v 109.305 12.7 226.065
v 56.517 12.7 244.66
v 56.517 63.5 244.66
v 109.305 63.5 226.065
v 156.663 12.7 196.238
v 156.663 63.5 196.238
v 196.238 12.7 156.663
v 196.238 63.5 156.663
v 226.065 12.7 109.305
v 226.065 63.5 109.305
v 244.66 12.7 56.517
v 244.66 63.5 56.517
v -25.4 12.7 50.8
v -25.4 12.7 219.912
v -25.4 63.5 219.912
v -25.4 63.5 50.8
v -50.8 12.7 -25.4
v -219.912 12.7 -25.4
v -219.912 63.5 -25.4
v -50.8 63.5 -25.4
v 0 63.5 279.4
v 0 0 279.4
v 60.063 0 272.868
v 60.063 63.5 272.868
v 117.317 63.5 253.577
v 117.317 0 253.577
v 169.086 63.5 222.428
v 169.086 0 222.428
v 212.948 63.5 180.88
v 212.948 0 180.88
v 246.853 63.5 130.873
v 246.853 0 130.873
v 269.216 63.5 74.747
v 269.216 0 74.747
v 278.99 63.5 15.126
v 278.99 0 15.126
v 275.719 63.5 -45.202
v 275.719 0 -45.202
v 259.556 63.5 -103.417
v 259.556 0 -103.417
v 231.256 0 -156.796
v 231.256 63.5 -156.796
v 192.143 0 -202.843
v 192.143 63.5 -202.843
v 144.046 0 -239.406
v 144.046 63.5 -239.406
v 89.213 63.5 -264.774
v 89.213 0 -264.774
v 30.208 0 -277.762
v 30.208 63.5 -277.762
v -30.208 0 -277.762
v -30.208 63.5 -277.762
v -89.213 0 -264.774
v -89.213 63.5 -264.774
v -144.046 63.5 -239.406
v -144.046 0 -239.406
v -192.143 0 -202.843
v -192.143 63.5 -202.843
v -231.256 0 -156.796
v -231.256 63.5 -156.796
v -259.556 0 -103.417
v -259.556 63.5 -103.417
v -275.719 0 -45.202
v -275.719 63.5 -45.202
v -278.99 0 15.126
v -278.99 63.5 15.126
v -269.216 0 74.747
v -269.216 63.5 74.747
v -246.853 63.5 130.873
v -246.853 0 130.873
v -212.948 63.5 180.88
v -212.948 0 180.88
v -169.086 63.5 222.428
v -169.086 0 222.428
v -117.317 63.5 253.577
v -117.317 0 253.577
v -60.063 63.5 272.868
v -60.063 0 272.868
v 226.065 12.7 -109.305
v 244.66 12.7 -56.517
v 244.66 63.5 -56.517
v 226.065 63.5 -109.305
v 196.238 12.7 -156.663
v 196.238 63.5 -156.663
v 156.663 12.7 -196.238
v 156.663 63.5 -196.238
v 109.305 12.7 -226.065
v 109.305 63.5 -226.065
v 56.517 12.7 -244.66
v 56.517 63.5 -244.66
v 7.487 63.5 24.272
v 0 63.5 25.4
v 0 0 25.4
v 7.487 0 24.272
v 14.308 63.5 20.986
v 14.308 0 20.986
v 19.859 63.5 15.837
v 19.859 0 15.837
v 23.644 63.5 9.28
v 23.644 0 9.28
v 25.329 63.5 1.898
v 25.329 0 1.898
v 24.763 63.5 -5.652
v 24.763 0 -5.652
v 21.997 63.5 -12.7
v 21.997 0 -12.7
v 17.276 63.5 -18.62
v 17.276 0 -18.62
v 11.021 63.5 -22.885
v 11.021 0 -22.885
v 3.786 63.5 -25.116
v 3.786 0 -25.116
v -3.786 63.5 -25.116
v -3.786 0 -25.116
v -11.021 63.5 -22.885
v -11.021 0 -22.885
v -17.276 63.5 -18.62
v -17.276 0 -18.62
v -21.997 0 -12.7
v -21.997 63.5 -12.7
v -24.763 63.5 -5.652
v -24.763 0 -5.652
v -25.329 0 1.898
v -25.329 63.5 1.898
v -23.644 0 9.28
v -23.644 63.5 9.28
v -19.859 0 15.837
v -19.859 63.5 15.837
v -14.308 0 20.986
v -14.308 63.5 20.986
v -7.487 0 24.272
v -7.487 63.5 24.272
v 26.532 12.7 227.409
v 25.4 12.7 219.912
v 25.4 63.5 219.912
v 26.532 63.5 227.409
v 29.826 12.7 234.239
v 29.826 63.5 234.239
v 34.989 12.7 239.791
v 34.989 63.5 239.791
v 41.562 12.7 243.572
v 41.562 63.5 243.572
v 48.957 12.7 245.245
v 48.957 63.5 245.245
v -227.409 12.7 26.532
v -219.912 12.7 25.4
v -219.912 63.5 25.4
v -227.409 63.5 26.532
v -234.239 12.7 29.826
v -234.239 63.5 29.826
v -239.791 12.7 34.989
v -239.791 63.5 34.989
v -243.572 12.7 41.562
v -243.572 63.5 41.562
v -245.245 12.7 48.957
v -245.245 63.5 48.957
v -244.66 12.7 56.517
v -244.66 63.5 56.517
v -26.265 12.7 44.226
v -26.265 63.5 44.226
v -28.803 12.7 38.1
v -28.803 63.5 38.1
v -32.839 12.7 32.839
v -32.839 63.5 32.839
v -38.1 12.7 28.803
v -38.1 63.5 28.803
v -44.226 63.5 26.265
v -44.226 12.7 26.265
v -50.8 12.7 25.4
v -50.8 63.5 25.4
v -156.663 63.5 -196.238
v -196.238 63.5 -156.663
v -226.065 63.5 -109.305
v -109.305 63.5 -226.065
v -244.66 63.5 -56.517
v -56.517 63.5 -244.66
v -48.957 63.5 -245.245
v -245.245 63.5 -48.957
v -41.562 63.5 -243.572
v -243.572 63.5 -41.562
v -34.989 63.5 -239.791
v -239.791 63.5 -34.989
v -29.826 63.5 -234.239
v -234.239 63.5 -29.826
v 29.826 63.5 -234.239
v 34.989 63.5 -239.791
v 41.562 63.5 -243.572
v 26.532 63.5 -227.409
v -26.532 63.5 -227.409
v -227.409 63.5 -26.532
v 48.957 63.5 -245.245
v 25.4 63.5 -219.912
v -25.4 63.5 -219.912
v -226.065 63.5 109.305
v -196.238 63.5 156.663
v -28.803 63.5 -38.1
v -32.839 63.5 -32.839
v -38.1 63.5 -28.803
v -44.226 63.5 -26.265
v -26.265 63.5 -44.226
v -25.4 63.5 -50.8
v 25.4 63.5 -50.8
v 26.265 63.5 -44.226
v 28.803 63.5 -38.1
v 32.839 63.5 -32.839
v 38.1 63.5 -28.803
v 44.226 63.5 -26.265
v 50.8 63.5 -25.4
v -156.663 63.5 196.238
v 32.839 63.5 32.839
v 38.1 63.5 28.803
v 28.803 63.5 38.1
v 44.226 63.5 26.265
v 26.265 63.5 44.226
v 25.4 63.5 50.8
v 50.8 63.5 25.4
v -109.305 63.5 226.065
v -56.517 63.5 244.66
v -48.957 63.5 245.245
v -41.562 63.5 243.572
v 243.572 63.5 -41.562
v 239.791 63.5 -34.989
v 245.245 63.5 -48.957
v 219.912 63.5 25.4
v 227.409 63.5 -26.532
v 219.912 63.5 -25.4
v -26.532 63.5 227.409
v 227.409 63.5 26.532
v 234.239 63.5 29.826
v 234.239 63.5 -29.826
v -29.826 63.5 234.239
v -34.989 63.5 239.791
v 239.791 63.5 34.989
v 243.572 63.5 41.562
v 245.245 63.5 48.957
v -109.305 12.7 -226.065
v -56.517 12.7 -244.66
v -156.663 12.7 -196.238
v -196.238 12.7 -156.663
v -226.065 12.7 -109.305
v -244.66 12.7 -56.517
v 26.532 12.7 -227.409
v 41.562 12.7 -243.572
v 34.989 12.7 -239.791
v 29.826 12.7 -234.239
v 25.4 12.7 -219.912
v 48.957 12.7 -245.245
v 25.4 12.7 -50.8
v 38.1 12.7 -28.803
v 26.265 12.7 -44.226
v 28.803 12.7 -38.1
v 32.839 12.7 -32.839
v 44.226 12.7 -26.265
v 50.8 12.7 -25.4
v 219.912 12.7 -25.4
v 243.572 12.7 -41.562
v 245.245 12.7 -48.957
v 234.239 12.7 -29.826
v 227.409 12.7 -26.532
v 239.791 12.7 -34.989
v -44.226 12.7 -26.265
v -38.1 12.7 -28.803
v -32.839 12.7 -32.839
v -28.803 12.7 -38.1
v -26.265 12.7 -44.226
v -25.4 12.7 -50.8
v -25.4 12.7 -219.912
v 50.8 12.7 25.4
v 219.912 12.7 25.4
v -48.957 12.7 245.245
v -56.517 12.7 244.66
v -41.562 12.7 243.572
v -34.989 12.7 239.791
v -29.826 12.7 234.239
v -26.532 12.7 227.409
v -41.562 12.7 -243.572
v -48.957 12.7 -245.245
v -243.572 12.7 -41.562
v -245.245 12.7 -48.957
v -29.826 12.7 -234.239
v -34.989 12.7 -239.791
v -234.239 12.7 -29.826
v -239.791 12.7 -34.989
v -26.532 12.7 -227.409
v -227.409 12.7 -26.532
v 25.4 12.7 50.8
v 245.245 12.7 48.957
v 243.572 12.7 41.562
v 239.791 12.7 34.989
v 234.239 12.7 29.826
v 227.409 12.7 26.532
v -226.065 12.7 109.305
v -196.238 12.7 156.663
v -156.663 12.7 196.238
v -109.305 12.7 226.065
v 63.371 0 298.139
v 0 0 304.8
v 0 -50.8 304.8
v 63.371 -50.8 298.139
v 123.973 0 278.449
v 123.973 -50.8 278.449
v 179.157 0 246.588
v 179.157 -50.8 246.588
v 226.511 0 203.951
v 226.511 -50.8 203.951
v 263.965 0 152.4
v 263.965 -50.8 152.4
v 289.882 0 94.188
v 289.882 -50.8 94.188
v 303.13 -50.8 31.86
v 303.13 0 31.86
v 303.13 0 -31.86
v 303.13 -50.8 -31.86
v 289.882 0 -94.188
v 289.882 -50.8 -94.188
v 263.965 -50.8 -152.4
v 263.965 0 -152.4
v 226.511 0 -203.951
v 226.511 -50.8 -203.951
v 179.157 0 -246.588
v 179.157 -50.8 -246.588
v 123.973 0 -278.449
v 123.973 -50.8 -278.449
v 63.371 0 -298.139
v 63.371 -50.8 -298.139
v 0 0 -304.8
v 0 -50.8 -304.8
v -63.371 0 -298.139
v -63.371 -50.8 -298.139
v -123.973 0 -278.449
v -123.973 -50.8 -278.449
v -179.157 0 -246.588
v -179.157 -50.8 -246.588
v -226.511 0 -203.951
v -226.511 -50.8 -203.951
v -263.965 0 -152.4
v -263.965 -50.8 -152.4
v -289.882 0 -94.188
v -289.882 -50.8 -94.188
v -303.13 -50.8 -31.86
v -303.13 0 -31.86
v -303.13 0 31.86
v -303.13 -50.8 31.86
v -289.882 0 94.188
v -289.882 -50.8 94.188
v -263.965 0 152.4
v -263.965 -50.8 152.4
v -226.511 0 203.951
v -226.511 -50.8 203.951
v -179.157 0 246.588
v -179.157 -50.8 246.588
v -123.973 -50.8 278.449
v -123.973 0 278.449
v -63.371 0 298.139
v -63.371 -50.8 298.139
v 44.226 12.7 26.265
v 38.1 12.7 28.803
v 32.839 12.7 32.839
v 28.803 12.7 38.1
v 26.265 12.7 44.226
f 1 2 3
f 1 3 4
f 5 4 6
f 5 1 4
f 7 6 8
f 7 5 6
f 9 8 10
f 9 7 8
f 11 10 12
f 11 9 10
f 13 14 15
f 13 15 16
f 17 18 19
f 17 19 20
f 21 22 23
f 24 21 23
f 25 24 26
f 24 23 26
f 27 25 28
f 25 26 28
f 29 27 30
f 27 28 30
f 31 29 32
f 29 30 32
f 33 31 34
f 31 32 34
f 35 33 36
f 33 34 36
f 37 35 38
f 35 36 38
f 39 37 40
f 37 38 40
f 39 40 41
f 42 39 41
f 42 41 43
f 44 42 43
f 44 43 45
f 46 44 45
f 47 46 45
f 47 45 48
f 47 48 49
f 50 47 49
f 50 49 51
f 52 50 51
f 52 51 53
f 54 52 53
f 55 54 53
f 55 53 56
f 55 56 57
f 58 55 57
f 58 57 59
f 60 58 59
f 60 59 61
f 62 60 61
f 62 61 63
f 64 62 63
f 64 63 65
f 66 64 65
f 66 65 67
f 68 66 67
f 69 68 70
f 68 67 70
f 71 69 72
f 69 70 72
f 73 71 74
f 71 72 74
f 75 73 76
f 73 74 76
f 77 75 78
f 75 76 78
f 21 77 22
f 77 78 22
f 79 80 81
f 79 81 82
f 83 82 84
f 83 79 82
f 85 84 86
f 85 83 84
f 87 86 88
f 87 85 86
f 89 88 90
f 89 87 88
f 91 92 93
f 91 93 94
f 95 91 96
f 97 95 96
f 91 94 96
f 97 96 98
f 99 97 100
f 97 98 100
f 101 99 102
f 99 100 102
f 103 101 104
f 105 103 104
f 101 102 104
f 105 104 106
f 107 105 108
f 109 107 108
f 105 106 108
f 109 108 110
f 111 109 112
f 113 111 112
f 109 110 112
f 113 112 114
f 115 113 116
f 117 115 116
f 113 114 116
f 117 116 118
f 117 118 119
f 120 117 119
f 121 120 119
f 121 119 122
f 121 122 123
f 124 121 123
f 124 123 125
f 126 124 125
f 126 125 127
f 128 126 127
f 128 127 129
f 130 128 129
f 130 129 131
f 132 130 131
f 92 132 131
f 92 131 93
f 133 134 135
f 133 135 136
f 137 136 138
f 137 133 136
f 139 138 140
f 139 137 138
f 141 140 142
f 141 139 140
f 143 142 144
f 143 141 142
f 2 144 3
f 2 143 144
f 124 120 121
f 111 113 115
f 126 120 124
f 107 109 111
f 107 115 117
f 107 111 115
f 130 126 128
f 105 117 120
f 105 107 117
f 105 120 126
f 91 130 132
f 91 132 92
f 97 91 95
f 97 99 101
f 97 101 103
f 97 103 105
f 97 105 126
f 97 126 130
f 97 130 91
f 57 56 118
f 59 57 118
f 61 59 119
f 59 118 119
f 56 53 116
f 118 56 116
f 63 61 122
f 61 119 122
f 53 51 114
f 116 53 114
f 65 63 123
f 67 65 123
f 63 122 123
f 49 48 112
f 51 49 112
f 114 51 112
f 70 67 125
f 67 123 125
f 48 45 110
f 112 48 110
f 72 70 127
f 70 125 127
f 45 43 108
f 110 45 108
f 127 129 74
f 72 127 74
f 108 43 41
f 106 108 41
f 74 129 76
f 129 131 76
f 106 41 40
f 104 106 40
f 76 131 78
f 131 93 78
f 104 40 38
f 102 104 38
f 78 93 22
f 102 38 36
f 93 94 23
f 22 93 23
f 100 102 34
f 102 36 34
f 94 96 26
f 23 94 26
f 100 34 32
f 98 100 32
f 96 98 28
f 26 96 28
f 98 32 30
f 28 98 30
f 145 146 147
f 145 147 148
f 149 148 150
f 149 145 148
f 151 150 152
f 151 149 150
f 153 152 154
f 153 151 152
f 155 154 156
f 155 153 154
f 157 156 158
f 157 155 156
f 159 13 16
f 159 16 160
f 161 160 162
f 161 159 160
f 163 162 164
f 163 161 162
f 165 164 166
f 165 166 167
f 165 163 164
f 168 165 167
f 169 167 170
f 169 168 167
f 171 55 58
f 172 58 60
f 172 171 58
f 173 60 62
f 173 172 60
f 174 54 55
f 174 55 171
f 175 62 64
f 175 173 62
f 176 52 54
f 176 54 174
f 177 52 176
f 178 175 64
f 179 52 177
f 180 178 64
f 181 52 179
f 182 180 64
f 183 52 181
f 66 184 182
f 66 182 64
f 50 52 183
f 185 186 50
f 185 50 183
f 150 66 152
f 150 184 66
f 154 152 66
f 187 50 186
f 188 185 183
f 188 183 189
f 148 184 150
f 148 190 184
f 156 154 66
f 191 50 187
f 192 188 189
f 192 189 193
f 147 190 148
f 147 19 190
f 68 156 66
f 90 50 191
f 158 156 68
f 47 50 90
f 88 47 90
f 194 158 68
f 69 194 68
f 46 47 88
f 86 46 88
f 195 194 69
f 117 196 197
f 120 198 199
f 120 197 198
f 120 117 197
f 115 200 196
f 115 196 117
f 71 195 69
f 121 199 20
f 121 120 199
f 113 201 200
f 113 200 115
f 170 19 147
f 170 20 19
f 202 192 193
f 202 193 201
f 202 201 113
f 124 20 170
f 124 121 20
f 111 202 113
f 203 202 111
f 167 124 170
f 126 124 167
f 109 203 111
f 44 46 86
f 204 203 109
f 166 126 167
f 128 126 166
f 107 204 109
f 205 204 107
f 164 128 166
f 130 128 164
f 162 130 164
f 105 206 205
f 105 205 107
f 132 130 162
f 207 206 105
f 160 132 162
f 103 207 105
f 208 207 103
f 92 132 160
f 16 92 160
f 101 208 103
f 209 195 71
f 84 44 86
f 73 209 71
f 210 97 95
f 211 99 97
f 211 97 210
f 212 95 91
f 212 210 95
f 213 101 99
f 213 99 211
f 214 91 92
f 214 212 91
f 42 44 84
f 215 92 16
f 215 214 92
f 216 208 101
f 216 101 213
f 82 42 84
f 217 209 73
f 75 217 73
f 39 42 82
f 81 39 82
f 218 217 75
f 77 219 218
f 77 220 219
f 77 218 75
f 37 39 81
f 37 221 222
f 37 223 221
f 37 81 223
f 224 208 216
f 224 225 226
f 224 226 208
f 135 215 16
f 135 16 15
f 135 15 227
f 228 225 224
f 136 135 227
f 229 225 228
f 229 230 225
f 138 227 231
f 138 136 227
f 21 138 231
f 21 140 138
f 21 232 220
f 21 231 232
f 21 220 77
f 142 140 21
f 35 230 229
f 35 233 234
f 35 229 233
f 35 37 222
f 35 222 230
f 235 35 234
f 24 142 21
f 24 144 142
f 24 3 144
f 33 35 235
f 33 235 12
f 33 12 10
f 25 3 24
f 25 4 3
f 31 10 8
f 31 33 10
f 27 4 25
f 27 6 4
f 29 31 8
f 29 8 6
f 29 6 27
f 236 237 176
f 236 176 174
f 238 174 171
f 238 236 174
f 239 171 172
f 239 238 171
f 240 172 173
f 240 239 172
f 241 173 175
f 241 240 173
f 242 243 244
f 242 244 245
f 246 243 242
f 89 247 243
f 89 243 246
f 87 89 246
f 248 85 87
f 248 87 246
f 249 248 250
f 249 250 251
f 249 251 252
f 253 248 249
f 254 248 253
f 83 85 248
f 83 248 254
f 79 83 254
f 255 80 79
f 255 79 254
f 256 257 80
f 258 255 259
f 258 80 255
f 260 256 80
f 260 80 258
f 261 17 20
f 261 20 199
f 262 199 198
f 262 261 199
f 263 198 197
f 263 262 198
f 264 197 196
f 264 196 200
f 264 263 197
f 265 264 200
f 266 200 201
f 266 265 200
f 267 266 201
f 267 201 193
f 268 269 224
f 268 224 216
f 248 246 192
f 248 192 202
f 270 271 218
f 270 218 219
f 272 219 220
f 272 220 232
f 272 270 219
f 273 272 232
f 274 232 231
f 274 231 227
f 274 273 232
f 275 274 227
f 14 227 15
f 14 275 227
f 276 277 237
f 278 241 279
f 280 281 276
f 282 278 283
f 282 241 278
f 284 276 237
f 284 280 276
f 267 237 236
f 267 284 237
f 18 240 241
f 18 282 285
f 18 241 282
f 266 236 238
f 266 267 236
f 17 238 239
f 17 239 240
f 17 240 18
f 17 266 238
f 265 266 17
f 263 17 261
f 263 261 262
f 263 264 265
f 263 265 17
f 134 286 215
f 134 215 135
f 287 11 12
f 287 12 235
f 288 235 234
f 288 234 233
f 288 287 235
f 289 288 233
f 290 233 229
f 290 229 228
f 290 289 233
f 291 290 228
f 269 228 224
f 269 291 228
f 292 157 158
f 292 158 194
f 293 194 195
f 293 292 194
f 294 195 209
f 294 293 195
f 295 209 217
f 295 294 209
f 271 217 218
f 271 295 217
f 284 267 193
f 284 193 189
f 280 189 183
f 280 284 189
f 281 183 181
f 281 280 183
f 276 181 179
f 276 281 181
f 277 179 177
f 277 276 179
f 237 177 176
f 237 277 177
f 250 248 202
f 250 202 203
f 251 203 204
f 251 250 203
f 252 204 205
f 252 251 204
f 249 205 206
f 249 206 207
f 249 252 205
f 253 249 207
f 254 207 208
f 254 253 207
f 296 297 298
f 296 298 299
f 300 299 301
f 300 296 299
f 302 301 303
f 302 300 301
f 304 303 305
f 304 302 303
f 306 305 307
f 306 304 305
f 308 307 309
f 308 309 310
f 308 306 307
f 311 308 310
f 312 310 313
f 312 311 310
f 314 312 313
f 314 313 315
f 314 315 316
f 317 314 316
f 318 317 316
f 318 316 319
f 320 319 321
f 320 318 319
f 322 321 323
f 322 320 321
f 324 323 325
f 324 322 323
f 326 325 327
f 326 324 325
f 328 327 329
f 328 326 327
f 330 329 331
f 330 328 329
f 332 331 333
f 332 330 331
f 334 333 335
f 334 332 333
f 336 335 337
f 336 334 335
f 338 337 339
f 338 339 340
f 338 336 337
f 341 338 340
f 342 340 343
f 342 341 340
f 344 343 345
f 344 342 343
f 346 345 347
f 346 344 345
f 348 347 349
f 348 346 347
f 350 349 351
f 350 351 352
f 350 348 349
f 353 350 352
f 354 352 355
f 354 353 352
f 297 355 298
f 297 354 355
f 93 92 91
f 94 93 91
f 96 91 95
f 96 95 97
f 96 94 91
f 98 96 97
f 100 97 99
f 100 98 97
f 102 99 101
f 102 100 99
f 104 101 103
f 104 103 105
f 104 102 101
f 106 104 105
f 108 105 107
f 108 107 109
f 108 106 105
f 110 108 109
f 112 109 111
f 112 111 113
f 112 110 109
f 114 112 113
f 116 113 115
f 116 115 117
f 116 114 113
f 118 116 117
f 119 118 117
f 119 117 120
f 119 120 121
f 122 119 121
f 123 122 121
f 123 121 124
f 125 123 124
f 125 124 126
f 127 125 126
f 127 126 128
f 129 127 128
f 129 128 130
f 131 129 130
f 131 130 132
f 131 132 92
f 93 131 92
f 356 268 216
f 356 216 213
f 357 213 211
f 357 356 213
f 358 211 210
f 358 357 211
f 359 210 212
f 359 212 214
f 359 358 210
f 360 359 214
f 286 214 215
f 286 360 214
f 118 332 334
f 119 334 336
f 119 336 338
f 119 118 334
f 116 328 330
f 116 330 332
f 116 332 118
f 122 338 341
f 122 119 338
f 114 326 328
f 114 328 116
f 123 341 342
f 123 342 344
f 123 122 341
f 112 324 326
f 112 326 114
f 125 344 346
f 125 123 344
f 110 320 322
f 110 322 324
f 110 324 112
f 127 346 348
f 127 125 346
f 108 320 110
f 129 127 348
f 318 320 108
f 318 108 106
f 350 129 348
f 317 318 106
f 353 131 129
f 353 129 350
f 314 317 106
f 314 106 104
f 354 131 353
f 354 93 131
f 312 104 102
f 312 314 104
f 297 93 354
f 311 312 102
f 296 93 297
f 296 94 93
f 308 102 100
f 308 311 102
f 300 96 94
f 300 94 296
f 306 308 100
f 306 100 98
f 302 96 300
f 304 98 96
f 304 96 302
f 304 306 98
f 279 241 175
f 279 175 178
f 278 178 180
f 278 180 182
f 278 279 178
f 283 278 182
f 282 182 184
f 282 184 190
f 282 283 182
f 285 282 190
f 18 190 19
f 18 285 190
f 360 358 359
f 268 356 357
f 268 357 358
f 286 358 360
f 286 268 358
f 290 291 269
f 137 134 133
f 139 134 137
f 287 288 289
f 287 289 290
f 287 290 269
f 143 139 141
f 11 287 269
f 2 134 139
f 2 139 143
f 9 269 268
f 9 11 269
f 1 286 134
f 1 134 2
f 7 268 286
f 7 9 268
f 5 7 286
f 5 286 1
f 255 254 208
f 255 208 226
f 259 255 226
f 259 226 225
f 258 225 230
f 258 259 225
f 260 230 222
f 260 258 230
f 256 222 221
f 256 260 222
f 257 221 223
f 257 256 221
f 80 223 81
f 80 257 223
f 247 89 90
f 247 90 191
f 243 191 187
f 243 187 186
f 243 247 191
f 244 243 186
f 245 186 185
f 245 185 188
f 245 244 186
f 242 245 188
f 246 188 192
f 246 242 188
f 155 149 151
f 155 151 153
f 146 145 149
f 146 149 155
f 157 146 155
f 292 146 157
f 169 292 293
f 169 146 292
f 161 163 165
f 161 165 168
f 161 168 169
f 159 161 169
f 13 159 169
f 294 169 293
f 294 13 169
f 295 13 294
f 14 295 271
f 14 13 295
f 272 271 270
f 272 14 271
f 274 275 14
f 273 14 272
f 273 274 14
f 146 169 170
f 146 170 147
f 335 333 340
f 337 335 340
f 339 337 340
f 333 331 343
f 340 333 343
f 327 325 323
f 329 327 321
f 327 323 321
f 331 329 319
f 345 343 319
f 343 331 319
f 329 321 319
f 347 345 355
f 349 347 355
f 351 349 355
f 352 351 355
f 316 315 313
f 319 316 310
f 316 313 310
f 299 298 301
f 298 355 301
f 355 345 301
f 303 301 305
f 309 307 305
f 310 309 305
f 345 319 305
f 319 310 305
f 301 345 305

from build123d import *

# Parameters (mm, degrees)
SKETCH1_R           = 304.8
BOSS_EXTRUDE1_DEPTH = 50.8
SKETCH1_6_R         = 25.4
BOSS_EXTRUDE6_DEPTH = 63.5
SKETCH1_5_R         = 25.4
BOSS_EXTRUDE4_DEPTH = 50.8
SKETCH5_R           = 279.4
SKETCH5_R_2         = 25.4
BOSS_EXTRUDE5_DEPTH = 12.7
SKETCH6_R           = 279.4
SKETCH6_R_2         = 25.4
BOSS_EXTRUDE7_DEPTH = 50.8


with BuildPart() as part:
    # Sketch1 → Boss-Extrude1 (new body)
    with BuildSketch(Plane(origin=(0, 0, 0), x_dir=(1, 0, 0), z_dir=(0, 1, 0))):
        Circle(SKETCH1_R)
    extrude(amount=-BOSS_EXTRUDE1_DEPTH)

    # Sketch1<6> → Boss-Extrude6 (add)
    with BuildSketch(Plane(origin=(0, 0, 0), x_dir=(1, 0, 0), z_dir=(0, 1, 0))):
        Circle(SKETCH1_6_R)
    extrude(amount=BOSS_EXTRUDE6_DEPTH)

    # Sketch1<5> → Boss-Extrude4 (add)
    with BuildSketch(Plane(origin=(0, 0, 0), x_dir=(1, 0, 0), z_dir=(0, 1, 0))):
        Circle(SKETCH1_5_R)
    extrude(amount=BOSS_EXTRUDE4_DEPTH)


with BuildPart() as body_2:
    # Sketch5 → Boss-Extrude5 (new body)
    with BuildSketch(Plane(origin=(0, 0, 0), x_dir=(1, 0, 0), z_dir=(0, 1, 0))):
        Circle(SKETCH5_R)
        Circle(SKETCH5_R_2, mode=Mode.SUBTRACT)
    extrude(amount=BOSS_EXTRUDE5_DEPTH)


with BuildPart() as body_3:
    # Sketch6 → Boss-Extrude7 (new body)
    with BuildSketch(Plane(origin=(0, 12.7, 0), x_dir=(1, 0, 0), z_dir=(0, 1, 0))):
        Circle(SKETCH6_R)
        with BuildLine():
            Line((-25.4, -50.8), (-25.4, -219.912108973))
            ThreePointArc((-25.4, -219.912108973), (-34.98938499, -239.791355765), (-56.516886063, -244.660385959))
            ThreePointArc((-56.516886063, -244.660385959), (-177.556840009, -177.556840009), (-244.660385959, -56.516886063))
            ThreePointArc((-244.660385959, -56.516886063), (-239.791355765, -34.98938499), (-219.912108973, -25.4))
            Line((-219.912108973, -25.4), (-50.8, -25.4))
            ThreePointArc((-50.8, -25.4), (-32.839487758, -32.839487758), (-25.4, -50.8))
        make_face(mode=Mode.SUBTRACT)
        with BuildLine():
            Line((50.8, -25.4), (219.912108973, -25.4))
            ThreePointArc((219.912108973, -25.4), (239.791355765, -34.98938499), (244.660385959, -56.516886063))
            ThreePointArc((244.660385959, -56.516886063), (177.556840009, -177.556840009), (56.516886063, -244.660385959))
            ThreePointArc((56.516886063, -244.660385959), (34.98938499, -239.791355765), (25.4, -219.912108973))
            Line((25.4, -219.912108973), (25.4, -50.8))
            ThreePointArc((25.4, -50.8), (32.839487758, -32.839487758), (50.8, -25.4))
        make_face(mode=Mode.SUBTRACT)
        with BuildLine():
            Line((-50.8, 25.4), (-219.912108973, 25.4))
            ThreePointArc((-219.912108973, 25.4), (-239.791355765, 34.98938499), (-244.660385959, 56.516886063))
            ThreePointArc((-244.660385959, 56.516886063), (-177.556840009, 177.556840009), (-56.516886063, 244.660385959))
            ThreePointArc((-56.516886063, 244.660385959), (-34.98938499, 239.791355765), (-25.4, 219.912108973))
            Line((-25.4, 219.912108973), (-25.4, 50.8))
            ThreePointArc((-25.4, 50.8), (-32.839487758, 32.839487758), (-50.8, 25.4))
        make_face(mode=Mode.SUBTRACT)
        Circle(SKETCH6_R_2, mode=Mode.SUBTRACT)
        with BuildLine():
            Line((25.4, 50.8), (25.4, 219.912108973))
            ThreePointArc((25.4, 219.912108973), (34.98938499, 239.791355765), (56.516886063, 244.660385959))
            ThreePointArc((56.516886063, 244.660385959), (177.556840009, 177.556840009), (244.660385959, 56.516886063))
            ThreePointArc((244.660385959, 56.516886063), (239.791355765, 34.98938499), (219.912108973, 25.4))
            Line((219.912108973, 25.4), (50.8, 25.4))
            ThreePointArc((50.8, 25.4), (32.839487758, 32.839487758), (25.4, 50.8))
        make_face(mode=Mode.SUBTRACT)
    extrude(amount=BOSS_EXTRUDE7_DEPTH)

    # Combine1: union body 2
    add(body_2.part)


solid = Compound([part.part, body_3.part])
